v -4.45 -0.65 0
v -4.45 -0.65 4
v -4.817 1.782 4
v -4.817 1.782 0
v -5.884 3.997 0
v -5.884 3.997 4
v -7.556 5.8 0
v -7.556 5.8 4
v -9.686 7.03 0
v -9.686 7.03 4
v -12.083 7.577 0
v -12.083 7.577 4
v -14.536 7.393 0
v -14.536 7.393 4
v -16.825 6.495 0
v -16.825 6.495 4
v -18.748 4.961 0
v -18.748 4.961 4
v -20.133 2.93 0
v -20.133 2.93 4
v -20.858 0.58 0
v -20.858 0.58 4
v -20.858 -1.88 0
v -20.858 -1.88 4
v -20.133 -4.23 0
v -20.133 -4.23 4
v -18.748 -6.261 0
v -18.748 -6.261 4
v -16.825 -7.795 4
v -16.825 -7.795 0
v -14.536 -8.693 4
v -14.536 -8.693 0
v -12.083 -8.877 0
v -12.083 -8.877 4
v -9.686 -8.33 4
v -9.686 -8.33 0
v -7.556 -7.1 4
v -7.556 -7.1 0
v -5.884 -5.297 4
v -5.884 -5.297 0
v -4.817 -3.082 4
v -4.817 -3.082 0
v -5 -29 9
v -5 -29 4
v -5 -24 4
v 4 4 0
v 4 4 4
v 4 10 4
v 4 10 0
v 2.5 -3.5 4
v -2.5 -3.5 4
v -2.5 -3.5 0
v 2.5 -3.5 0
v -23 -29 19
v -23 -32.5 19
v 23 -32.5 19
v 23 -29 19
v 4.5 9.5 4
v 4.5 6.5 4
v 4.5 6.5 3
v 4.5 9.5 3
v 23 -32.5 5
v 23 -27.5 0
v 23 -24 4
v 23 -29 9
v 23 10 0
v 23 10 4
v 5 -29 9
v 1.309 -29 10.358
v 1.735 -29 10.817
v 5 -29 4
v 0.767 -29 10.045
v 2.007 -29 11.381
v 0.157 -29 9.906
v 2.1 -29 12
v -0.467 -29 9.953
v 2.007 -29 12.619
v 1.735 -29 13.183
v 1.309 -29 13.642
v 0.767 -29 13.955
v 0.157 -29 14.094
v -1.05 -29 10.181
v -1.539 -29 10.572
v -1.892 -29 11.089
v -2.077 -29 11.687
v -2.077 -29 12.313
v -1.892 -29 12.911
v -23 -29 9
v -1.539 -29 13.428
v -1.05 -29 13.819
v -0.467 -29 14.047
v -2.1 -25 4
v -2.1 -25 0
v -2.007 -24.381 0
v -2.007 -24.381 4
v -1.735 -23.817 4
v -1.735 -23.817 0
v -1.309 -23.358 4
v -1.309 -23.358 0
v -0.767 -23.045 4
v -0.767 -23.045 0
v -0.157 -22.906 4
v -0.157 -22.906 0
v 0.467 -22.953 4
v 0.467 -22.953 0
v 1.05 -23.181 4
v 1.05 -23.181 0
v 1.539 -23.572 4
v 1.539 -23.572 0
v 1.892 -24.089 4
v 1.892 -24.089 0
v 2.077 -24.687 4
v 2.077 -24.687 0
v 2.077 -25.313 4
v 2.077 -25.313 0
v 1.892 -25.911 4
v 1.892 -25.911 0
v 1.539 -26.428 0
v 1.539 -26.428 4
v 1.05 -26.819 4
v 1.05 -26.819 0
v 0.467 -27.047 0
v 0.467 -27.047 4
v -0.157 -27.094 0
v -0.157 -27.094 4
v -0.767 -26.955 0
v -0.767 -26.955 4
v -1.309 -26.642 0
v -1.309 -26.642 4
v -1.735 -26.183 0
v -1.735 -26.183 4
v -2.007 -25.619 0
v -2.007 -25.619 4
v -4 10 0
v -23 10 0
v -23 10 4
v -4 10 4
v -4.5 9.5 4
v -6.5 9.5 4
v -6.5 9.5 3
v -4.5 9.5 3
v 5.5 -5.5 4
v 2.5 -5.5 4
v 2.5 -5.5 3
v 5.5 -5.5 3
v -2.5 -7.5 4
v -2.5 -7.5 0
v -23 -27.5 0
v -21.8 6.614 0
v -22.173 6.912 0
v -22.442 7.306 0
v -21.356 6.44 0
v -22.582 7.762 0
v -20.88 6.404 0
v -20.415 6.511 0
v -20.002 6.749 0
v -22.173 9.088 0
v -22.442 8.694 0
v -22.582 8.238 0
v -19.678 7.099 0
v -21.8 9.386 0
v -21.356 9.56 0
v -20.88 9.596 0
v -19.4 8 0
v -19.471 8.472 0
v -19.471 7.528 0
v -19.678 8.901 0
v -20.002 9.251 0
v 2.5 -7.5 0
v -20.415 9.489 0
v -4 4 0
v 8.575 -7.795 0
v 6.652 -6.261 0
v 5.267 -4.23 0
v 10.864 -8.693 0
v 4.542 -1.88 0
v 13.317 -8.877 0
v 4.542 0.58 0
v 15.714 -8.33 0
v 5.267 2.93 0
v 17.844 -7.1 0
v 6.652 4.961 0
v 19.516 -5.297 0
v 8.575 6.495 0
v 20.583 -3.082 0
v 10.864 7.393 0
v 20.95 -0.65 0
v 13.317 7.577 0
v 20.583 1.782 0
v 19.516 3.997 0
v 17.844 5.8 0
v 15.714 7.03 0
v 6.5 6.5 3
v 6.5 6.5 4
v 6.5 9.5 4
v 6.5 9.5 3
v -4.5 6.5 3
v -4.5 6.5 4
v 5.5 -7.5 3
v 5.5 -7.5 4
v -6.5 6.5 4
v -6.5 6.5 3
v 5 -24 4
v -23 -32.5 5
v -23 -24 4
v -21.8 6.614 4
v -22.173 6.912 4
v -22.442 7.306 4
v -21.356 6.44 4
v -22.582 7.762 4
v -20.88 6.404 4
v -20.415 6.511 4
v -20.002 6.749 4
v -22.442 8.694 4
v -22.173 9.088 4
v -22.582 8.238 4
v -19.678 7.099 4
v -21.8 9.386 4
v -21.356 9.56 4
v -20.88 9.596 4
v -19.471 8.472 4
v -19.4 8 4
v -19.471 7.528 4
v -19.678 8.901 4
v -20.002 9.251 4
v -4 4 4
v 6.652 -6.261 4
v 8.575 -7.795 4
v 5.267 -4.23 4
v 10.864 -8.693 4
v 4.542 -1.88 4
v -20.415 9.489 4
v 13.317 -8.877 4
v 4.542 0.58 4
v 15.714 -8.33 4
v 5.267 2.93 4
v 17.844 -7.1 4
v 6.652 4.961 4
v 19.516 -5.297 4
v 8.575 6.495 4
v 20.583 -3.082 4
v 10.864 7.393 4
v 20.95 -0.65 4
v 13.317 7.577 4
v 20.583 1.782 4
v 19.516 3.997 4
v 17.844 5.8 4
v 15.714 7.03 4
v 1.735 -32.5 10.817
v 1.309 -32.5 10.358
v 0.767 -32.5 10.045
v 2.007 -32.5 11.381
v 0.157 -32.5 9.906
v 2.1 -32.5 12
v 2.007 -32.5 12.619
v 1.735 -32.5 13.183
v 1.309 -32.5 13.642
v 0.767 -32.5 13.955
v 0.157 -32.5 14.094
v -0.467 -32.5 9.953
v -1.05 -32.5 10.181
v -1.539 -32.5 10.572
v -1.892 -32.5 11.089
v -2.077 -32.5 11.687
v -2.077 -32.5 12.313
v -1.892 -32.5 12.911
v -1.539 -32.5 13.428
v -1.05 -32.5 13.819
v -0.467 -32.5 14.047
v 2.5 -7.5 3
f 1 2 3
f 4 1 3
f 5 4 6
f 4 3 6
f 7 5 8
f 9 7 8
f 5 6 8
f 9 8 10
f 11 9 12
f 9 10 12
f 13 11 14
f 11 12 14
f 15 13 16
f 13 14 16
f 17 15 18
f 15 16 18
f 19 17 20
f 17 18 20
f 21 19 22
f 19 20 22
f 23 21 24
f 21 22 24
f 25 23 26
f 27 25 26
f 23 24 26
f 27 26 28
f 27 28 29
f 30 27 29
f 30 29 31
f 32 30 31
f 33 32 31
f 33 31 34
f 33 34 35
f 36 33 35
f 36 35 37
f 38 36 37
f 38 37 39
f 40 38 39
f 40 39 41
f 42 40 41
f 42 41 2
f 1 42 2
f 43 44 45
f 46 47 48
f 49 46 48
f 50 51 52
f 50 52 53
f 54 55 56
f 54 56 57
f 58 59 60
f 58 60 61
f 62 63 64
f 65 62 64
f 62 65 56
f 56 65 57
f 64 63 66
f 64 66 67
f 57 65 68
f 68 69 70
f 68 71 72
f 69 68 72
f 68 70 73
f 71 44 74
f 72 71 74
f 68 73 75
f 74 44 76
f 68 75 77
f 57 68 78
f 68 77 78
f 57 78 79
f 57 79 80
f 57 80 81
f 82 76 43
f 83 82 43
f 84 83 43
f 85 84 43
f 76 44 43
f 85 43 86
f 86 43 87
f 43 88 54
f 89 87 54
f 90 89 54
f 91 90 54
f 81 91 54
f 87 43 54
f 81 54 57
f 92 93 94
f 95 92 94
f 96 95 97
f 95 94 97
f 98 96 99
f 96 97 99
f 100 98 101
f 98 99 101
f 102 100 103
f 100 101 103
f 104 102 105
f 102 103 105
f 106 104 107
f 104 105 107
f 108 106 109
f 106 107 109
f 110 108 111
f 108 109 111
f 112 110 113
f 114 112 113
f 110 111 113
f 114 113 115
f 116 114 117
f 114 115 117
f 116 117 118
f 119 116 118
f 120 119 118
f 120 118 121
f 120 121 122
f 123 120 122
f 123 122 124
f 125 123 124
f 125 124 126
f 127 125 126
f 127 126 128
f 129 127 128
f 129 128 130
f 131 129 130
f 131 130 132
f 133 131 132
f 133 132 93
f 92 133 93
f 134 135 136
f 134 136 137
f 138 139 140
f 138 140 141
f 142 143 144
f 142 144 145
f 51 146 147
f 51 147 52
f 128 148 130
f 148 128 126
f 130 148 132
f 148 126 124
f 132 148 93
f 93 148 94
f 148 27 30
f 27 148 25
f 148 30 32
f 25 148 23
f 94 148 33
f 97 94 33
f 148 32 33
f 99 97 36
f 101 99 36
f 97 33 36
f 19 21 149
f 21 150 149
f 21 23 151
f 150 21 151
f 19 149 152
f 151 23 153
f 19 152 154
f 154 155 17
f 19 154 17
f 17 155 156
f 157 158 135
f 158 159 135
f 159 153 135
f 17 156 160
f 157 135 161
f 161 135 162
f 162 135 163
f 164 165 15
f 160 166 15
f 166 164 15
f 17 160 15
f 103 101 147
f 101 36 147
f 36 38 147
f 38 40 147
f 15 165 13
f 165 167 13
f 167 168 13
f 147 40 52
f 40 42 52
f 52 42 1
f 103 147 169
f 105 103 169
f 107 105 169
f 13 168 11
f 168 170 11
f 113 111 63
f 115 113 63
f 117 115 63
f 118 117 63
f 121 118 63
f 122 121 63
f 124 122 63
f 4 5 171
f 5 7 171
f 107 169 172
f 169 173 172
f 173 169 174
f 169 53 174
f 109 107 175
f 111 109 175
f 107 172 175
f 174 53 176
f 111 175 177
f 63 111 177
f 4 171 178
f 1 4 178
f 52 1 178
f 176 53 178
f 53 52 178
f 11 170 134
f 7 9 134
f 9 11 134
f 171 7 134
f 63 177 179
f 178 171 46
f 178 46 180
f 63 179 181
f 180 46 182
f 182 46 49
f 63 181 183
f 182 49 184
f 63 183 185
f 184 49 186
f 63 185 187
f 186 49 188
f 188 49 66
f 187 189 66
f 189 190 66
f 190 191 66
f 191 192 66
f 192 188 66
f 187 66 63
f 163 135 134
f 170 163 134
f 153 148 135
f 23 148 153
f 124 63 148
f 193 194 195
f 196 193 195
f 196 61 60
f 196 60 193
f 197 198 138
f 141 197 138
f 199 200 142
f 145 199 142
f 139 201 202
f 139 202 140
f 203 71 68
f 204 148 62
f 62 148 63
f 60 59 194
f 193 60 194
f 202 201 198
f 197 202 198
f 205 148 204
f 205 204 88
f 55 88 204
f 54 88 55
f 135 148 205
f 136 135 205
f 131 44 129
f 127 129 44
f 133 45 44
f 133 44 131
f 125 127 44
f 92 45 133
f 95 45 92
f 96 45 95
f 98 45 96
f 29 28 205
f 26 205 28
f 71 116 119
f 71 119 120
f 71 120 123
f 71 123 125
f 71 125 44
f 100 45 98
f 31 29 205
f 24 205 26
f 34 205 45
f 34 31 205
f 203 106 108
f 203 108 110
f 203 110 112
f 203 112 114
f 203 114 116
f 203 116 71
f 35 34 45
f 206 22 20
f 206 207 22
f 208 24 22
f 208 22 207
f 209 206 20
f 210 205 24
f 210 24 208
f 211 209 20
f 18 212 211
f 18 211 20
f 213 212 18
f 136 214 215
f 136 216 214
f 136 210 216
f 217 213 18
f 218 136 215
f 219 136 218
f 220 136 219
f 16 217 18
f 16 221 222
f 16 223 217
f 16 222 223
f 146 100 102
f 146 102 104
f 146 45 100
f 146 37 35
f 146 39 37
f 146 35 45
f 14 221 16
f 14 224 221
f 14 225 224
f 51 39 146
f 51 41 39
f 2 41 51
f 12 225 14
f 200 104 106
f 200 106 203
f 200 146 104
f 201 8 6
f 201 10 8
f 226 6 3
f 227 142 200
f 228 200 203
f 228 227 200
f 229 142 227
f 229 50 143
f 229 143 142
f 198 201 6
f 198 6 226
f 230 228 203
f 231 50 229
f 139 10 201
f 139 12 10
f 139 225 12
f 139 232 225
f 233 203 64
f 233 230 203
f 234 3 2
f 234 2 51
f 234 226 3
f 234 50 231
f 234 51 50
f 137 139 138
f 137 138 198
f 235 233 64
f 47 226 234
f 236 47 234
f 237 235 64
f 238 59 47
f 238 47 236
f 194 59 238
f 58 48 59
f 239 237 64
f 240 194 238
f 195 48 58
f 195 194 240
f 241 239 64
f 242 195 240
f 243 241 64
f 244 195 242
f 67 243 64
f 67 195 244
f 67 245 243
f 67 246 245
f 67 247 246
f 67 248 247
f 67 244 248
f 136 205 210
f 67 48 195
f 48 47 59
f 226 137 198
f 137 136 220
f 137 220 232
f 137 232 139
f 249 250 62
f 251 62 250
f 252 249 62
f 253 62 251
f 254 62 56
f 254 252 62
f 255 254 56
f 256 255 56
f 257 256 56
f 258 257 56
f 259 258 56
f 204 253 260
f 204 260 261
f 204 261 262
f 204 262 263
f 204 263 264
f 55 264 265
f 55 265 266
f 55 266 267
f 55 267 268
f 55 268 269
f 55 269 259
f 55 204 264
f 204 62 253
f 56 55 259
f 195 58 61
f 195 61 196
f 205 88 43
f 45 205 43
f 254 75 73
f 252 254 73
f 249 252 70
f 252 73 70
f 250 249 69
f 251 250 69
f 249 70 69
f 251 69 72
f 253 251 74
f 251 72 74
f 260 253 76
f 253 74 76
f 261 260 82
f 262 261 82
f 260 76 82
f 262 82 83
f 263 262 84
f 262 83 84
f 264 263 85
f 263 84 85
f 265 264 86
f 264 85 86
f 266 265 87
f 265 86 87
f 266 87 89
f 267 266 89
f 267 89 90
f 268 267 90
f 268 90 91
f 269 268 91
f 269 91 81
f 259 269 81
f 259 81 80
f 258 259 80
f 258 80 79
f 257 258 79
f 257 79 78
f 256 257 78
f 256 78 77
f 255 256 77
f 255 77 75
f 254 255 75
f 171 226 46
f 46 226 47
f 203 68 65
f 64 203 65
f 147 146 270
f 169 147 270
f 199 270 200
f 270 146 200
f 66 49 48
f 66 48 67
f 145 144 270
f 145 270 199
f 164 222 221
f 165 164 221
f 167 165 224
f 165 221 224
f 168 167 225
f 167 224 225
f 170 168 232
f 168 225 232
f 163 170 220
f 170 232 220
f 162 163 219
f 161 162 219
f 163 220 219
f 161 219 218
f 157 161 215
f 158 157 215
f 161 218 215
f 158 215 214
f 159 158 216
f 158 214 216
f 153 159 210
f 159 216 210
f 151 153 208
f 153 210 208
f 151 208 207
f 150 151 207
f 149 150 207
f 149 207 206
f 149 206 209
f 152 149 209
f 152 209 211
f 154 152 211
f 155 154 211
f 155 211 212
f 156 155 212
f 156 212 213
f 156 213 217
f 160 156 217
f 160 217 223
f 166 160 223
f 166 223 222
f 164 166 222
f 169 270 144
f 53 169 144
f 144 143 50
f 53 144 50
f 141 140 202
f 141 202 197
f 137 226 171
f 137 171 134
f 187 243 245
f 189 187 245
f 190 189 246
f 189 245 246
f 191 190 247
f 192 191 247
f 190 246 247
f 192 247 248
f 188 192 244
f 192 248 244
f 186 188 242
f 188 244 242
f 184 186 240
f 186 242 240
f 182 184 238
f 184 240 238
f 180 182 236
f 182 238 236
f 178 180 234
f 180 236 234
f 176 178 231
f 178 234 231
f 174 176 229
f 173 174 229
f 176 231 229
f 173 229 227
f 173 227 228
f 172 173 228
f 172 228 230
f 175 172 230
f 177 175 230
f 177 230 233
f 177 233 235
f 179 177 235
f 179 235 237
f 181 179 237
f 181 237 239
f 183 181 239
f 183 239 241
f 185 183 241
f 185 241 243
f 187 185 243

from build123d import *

# Parameters (mm, degrees)
SKETCH_1_W           = 46
SKETCH_1_H           = 20
EXTRUDE_1_DEPTH      = 4
SKETCH_2_R           = 8.25
CUT_EXTRUDE_1_DEPTH  = 5
SKETCH_3_W           = 8
SKETCH_3_H           = 6
CUT_EXTRUDE_2_DEPTH  = 5
SKETCH_4_W           = 5
SKETCH_4_H           = 4
CUT_EXTRUDE_3_DEPTH  = 5
SKETCH_5_W           = 3
SKETCH_5_H           = 2
SKETCH_5_W_2         = 2
SKETCH_5_H_2         = 3
CUT_EXTRUDE_4_DEPTH  = 1
SKETCH_6_W           = 46
SKETCH_6_H           = 4
EXTRUDE_2_DEPTH      = 22.5
SKETCH_8_W           = 15
SKETCH_8_H           = 3.5
EXTRUDE_4_DEPTH      = 46
CHAMFER_3_SIZE       = 5
SKETCH_9_R           = 2.1
CUT_EXTRUDE_5_DEPTH  = 4.5
SKETCH_10_R          = 2.1
CUT_EXTRUDE_6_DEPTH  = 20
SKETCH_13_W          = 10
SKETCH_13_H          = 8
CUT_EXTRUDE_9_DEPTH  = 46
SKETCH_14_R          = 1.6
CUT_EXTRUDE_10_DEPTH = 46


with BuildPart() as part:
    # 草圖1 → 填料-伸長1 (new body)
    with BuildSketch(Plane.XY):
        Rectangle(SKETCH_1_W, SKETCH_1_H)
    extrude(amount=EXTRUDE_1_DEPTH)

    # 草圖2 → 除料-伸長1 (cut, through all)
    with BuildSketch(Plane.XY.offset(4)):
        with Locations((-12.7, -0.65)):
            Circle(SKETCH_2_R)
        with Locations((12.7, -0.65)):
            Circle(SKETCH_2_R)
    extrude(amount=-CUT_EXTRUDE_1_DEPTH, mode=Mode.SUBTRACT)

    # 草圖3 → 除料-伸長2 (cut, through all)
    with BuildSketch(Plane.XY.offset(4)):
        with Locations((0, 7)):
            Rectangle(SKETCH_3_W, SKETCH_3_H)
    extrude(amount=-CUT_EXTRUDE_2_DEPTH, mode=Mode.SUBTRACT)

    # 草圖4 → 除料-伸長3 (cut, through all)
    with BuildSketch(Plane.XY.offset(4)):
        with Locations((0, -5.5)):
            Rectangle(SKETCH_4_W, SKETCH_4_H)
    extrude(amount=-CUT_EXTRUDE_3_DEPTH, mode=Mode.SUBTRACT)

    # 草圖5 → 除料-伸長4 (cut)
    with BuildSketch(Plane.XY.offset(4)):
        with Locations((4, -6.5)):
            Rectangle(SKETCH_5_W, SKETCH_5_H)
        with Locations((-5.5, 8)):
            Rectangle(SKETCH_5_W_2, SKETCH_5_H_2)
        with Locations((5.5, 8)):
            Rectangle(SKETCH_5_W_2, SKETCH_5_H_2)
    extrude(amount=-CUT_EXTRUDE_4_DEPTH, mode=Mode.SUBTRACT)

    # 草圖6 → 填料-伸長2 (add)
    with BuildSketch(Plane.XZ.offset(10)):
        with Locations((0, 2)):
            Rectangle(SKETCH_6_W, SKETCH_6_H)
    extrude(amount=EXTRUDE_2_DEPTH)

    # 草圖8 → 填料-伸長4 (add)
    with BuildSketch(Plane.ZY.offset(23)):
        with Locations((11.5, -30.75)):
            Rectangle(SKETCH_8_W, SKETCH_8_H)
    extrude(amount=-EXTRUDE_4_DEPTH)

    # 導角3
    chamfer_3_edges = [part.edges().sort_by_distance(p)[0] for p in [
        (0, -29, 4),
        (0, -32.5, 0),
    ]]
    chamfer(chamfer_3_edges, length=CHAMFER_3_SIZE)

    # 草圖9 → 除料-伸長5 (cut, through all)
    with BuildSketch(Plane(origin=(0, -29, 0), x_dir=(1, 0, 0), z_dir=(0, 1, 0))):
        with Locations((0, -12)):
            Circle(SKETCH_9_R)
    extrude(amount=-CUT_EXTRUDE_5_DEPTH, mode=Mode.SUBTRACT)

    # 草圖10 → 除料-伸長6 (cut, through all)
    with BuildSketch(Plane(origin=(0, 0, 0), x_dir=(-1, 0, 0), z_dir=(0, 0, -1))):
        with Locations((0, -25)):
            Circle(SKETCH_10_R)
    extrude(amount=-CUT_EXTRUDE_6_DEPTH, mode=Mode.SUBTRACT)

    # 草圖13 → 除料-伸長9 (cut)
    with BuildSketch(Plane.XY.offset(4)):
        with Locations((0, -25)):
            Rectangle(SKETCH_13_W, SKETCH_13_H)
    extrude(amount=CUT_EXTRUDE_9_DEPTH, mode=Mode.SUBTRACT)

    # 草圖14 → 除料-伸長10 (cut)
    with BuildSketch(Plane.XY.offset(4)):
        with Locations((-21, 8)):
            Circle(SKETCH_14_R)
    extrude(amount=-CUT_EXTRUDE_10_DEPTH, mode=Mode.SUBTRACT)


solid = part.part
